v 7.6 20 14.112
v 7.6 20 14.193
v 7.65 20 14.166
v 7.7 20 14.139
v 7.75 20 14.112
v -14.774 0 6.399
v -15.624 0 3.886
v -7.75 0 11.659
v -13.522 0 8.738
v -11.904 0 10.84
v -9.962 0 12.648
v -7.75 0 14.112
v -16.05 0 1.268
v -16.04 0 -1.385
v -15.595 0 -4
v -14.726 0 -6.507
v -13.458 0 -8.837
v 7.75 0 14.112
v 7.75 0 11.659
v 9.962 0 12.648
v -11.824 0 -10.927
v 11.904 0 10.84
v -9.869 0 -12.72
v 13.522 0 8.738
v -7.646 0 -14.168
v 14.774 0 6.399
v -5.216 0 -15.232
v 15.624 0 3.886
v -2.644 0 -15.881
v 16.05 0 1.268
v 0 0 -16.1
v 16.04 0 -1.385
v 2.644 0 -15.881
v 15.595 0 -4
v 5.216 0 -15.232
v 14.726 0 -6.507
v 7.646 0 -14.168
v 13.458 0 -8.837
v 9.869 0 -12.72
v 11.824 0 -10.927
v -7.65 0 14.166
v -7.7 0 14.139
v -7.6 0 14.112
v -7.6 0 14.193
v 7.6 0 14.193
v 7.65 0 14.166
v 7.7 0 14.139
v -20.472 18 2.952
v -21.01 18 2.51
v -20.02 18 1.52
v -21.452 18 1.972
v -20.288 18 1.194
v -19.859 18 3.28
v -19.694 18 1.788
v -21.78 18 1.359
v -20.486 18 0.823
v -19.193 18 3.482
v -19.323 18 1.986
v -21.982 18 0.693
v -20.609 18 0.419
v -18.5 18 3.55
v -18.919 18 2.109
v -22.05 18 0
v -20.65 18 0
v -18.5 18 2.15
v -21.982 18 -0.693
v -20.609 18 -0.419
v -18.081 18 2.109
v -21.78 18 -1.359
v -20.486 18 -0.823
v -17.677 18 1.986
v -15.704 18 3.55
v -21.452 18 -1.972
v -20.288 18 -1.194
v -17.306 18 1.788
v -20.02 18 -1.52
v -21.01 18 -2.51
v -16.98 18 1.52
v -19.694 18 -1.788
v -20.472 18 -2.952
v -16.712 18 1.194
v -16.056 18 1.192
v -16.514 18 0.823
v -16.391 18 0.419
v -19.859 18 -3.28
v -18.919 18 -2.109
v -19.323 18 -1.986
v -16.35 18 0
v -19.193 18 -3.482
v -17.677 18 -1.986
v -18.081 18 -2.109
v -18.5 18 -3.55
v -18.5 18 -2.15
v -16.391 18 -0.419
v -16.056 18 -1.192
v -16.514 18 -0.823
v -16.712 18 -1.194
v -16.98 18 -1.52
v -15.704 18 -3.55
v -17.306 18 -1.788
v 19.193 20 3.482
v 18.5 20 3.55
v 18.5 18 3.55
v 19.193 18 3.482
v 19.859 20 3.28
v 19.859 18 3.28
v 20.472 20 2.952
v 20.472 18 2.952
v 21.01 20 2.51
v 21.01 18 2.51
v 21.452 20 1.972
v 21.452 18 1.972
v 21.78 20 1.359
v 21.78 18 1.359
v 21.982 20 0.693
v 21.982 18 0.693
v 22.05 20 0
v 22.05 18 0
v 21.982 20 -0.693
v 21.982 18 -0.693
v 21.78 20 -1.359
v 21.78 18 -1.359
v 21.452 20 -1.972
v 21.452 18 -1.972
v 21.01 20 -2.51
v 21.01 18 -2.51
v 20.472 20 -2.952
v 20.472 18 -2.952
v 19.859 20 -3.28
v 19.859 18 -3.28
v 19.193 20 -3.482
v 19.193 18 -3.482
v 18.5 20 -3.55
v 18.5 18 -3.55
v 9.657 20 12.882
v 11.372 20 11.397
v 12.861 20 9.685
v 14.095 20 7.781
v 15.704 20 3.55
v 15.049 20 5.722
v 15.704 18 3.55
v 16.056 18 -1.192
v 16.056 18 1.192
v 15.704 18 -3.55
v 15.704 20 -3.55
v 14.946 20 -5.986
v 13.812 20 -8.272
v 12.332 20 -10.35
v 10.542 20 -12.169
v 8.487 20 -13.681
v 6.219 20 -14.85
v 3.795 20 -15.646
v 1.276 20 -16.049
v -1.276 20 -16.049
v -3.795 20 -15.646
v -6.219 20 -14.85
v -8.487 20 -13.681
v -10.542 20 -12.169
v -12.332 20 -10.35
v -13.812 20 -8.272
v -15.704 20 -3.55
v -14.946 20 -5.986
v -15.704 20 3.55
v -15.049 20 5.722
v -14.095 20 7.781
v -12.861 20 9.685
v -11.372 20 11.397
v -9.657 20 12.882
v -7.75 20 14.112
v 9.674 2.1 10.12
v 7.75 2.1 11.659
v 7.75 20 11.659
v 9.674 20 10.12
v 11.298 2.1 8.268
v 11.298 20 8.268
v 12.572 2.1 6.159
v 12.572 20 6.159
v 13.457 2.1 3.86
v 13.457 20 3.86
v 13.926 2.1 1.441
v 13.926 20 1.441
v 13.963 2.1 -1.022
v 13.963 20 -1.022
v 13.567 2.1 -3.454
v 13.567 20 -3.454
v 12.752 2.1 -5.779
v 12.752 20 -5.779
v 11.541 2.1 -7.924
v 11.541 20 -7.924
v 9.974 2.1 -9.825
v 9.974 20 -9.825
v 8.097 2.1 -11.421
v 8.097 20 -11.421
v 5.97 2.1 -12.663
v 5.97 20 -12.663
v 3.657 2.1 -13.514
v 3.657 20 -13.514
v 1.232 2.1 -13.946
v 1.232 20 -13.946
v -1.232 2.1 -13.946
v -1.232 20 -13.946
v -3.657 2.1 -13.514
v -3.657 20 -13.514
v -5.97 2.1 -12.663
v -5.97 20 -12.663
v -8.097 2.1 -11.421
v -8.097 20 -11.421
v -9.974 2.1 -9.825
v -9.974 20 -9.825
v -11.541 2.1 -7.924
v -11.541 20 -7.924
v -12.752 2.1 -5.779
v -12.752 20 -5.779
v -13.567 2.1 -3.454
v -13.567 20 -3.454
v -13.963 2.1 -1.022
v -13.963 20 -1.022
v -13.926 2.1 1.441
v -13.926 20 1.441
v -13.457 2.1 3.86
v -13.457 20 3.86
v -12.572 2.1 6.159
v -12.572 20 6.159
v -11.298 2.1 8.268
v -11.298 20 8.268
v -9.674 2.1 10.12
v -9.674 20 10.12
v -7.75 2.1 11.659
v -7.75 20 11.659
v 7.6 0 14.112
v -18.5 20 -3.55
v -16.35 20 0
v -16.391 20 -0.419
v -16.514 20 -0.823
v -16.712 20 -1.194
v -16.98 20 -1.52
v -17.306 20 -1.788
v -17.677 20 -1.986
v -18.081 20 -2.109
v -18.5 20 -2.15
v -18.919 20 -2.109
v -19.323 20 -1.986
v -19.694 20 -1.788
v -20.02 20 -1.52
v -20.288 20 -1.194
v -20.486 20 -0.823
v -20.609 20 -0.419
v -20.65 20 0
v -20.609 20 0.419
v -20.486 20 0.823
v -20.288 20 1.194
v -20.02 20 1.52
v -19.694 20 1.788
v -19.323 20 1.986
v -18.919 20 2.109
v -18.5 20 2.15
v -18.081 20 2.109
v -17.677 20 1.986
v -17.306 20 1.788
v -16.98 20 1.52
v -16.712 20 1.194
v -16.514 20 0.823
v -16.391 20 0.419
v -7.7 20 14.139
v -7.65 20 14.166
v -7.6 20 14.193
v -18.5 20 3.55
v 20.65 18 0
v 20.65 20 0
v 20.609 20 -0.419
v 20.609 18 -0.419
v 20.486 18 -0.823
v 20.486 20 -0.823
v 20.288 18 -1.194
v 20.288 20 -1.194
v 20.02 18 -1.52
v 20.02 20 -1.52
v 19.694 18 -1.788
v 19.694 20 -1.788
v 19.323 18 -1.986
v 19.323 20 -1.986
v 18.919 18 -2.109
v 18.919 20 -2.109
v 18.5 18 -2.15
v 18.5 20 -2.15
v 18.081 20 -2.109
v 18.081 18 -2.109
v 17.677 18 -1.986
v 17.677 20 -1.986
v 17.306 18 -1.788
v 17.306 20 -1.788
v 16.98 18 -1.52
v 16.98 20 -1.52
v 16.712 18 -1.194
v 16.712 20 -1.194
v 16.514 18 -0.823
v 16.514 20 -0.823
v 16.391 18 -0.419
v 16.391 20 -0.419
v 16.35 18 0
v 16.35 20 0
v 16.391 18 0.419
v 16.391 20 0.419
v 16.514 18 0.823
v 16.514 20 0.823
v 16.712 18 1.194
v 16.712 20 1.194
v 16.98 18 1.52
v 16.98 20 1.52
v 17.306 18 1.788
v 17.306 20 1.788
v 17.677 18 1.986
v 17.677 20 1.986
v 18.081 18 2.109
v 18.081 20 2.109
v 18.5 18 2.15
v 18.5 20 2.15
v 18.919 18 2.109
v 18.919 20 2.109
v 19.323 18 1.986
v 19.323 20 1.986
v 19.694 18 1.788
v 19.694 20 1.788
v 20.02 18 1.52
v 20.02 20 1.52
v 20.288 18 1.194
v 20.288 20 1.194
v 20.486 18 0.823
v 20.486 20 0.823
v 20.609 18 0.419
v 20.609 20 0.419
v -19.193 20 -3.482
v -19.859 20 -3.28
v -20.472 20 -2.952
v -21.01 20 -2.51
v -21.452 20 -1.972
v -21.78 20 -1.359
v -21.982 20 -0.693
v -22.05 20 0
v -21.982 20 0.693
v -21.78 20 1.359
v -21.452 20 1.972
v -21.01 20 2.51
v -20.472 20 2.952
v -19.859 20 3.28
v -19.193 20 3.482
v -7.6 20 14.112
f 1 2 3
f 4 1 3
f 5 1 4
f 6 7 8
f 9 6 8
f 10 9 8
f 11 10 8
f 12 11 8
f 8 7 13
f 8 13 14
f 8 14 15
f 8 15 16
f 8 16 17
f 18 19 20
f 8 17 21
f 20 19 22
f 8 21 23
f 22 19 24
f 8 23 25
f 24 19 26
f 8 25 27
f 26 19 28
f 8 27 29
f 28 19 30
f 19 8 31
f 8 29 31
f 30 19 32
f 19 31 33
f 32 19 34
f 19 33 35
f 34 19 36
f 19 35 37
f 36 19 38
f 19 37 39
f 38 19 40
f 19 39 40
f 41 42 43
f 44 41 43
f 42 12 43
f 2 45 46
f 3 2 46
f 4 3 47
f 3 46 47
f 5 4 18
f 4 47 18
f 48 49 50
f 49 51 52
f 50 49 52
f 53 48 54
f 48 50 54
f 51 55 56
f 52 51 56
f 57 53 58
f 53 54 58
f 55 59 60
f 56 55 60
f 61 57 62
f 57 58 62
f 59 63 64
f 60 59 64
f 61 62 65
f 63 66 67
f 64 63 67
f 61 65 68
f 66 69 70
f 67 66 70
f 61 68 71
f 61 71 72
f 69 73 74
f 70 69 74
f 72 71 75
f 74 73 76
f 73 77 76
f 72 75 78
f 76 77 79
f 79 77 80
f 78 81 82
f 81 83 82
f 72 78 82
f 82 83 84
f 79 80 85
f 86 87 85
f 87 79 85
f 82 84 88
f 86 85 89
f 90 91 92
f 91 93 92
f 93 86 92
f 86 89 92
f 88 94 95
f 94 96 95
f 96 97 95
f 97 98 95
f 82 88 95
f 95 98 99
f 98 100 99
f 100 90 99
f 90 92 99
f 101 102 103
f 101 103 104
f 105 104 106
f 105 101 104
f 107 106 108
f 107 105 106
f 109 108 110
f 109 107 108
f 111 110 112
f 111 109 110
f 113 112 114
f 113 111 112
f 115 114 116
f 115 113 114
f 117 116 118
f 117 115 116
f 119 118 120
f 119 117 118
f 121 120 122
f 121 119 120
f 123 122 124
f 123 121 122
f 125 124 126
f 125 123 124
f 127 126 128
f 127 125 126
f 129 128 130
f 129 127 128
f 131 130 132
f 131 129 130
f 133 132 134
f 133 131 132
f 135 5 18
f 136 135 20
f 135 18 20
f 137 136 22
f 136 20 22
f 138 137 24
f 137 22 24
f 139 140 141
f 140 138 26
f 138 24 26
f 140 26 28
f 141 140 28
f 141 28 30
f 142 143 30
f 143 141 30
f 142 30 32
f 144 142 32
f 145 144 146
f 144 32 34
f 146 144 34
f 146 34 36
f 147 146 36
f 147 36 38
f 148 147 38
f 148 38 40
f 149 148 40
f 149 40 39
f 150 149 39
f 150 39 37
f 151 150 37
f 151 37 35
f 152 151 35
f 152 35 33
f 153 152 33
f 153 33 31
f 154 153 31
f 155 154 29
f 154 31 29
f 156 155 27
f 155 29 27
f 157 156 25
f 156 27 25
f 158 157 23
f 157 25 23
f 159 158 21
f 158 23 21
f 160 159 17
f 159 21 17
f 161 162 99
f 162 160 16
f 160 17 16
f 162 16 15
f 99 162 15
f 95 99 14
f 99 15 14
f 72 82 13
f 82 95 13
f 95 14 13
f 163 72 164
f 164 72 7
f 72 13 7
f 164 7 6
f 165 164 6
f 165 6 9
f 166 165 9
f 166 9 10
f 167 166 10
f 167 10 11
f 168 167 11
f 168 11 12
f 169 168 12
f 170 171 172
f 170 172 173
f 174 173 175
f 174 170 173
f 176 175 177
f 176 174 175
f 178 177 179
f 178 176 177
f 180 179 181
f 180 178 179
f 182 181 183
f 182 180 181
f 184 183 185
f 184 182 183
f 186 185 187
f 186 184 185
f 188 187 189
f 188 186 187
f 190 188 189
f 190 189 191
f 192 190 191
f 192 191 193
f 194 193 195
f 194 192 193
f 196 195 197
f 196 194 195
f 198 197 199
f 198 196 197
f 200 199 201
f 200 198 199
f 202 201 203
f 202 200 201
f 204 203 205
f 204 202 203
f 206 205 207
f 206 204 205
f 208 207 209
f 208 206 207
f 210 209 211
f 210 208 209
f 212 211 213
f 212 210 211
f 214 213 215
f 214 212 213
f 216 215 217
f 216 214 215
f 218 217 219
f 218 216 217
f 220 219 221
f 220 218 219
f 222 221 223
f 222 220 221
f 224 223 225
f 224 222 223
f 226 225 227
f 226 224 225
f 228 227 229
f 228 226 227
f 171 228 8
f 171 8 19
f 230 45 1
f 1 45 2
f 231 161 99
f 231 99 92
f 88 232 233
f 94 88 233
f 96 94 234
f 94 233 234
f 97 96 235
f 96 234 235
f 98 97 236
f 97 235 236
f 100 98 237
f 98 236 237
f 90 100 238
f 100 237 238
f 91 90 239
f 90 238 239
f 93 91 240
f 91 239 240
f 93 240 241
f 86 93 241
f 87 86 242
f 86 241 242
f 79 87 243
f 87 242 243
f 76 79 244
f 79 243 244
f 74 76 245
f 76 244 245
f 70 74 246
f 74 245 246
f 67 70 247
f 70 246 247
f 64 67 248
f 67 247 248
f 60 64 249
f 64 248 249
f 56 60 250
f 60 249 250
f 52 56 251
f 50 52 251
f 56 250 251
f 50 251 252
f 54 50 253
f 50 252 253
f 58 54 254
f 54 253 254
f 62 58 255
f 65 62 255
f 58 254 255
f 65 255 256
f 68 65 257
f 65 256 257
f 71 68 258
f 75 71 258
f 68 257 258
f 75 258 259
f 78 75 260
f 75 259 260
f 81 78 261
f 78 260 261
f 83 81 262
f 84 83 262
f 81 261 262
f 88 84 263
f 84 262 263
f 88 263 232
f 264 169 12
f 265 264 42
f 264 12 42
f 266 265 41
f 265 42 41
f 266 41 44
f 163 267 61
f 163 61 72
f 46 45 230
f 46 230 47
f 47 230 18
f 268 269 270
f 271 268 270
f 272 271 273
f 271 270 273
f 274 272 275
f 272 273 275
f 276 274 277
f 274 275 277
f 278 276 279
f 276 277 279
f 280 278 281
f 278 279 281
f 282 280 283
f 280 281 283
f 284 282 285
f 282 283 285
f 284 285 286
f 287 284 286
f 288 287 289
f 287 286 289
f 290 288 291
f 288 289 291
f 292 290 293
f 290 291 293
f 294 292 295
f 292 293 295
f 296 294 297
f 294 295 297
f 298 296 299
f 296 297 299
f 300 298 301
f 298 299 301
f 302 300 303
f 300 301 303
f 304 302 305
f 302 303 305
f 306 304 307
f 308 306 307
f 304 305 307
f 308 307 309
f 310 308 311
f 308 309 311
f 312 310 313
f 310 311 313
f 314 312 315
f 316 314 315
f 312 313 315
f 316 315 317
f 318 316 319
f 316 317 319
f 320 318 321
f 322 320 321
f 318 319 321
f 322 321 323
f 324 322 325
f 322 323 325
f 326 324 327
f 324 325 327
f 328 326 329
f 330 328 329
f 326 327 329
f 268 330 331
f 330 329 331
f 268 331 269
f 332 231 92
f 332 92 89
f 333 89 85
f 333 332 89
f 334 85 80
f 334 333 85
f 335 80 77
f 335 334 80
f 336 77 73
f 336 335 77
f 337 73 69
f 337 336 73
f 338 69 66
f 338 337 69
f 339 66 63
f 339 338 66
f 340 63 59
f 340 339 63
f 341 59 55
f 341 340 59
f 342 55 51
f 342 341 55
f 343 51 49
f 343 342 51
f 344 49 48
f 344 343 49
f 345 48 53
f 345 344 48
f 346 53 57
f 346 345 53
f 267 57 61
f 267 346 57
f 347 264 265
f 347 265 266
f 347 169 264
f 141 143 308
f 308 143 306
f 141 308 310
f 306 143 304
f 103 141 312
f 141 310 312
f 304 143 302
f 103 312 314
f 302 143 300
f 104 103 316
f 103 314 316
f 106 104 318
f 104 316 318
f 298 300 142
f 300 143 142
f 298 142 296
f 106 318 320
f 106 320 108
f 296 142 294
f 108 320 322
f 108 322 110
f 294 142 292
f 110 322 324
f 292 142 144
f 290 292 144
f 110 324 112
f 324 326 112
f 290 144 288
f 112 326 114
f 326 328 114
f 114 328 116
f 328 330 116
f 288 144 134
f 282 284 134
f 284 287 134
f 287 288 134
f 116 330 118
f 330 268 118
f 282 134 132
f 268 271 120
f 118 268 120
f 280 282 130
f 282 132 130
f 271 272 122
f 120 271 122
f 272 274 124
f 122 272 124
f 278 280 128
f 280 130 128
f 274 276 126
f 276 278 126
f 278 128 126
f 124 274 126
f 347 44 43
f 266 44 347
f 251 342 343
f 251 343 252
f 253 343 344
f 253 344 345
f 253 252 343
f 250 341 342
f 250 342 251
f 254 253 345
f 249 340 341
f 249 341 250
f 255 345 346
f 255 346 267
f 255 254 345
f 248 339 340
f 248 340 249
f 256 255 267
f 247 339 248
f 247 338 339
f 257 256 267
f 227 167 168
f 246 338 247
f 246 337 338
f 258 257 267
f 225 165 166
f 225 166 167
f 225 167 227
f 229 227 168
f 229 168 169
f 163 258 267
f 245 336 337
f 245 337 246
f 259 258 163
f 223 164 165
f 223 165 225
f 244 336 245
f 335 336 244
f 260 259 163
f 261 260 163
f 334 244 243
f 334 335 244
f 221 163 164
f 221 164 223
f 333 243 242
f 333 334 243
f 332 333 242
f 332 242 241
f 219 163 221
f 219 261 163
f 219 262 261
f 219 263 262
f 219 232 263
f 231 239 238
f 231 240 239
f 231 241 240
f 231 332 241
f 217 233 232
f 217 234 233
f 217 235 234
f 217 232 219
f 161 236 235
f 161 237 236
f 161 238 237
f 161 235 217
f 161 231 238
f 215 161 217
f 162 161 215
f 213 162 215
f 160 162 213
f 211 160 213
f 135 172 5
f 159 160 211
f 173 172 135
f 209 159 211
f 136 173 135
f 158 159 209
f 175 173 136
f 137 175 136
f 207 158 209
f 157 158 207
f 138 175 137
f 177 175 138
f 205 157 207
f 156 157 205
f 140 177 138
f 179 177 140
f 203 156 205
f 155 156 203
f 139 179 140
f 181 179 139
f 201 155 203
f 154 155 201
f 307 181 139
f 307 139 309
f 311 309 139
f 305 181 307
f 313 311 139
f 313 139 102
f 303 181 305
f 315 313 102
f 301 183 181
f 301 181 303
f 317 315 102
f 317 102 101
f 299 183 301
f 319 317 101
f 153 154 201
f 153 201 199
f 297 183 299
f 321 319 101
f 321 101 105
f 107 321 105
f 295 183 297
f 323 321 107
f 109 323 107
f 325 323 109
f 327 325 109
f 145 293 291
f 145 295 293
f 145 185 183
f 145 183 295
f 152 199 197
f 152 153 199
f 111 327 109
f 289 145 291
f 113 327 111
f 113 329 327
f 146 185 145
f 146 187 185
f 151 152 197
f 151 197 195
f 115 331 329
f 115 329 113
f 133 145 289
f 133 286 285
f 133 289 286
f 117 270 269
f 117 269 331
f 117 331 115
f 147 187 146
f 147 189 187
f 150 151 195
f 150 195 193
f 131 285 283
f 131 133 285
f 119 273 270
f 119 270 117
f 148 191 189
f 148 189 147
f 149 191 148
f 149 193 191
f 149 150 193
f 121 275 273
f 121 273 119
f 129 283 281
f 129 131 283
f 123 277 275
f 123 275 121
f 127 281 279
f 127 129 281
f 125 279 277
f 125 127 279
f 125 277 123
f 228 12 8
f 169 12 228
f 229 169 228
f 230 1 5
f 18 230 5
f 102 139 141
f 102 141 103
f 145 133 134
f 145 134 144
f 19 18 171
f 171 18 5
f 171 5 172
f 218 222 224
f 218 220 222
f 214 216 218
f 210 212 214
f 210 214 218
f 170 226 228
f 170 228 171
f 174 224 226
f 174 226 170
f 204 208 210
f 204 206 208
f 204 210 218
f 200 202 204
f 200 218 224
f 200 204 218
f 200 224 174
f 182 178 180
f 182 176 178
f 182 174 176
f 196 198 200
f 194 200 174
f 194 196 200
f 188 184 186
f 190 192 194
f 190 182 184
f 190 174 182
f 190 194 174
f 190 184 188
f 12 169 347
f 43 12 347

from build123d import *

# Parameters (mm, degrees)
BOSS_EXTRUDE1_DEPTH = 20
SHELL2_T            = -2.1
SKETCH2_R           = 2.15
BOSS_EXTRUDE2_DEPTH = 2
SKETCH3_W           = 15.5
SKETCH3_H           = 2.452739194
CUT_EXTRUDE1_DEPTH  = 21
CUT_EXTRUDE2_REACH  = 32.293
SKETCH4_W           = 15.2
SKETCH4_H           = 20


with BuildPart() as part:
    # Sketch1 → Boss-Extrude1 (new body)
    with BuildSketch(Plane(origin=(0, 0, 0), x_dir=(1, 0, 0), z_dir=(0, 1, 0))):
        with BuildLine():
            Line((-7.6, -14.193308282), (7.6, -14.193308282))
            ThreePointArc((7.6, -14.193308282), (0, 16.1), (-7.6, -14.193308282))
        make_face()
    extrude(amount=BOSS_EXTRUDE1_DEPTH)

    # Shell2
    shell2_openings = [part.faces().sort_by_distance(p)[0] for p in [
        (0, 20, -0.953345859),
    ]]
    offset(amount=SHELL2_T, openings=shell2_openings)

    # Sketch2 → Boss-Extrude2 (add)
    with BuildSketch(Plane(origin=(0, 20, 0), x_dir=(1, 0, 0), z_dir=(0, 1, 0))):
        with BuildLine():
            Line((-15.703741592, 3.55), (-18.5, 3.55))
            ThreePointArc((-18.5, 3.55), (-22.05, 0), (-18.5, -3.55))
            Line((-18.5, -3.55), (-15.703741592, -3.55))
            ThreePointArc((-15.703741592, -3.55), (-16.1, 0), (-15.703741592, 3.55))
        make_face()
        with Locations((-18.5, 0)):
            Circle(SKETCH2_R, mode=Mode.SUBTRACT)
        with BuildLine():
            Line((18.5, 3.55), (15.703741592, 3.55))
            ThreePointArc((15.703741592, 3.55), (16.1, 0), (15.703741592, -3.55))
            Line((15.703741592, -3.55), (18.5, -3.55))
            ThreePointArc((18.5, -3.55), (22.05, 0), (18.5, 3.55))
        make_face()
        with Locations((18.5, 0)):
            Circle(SKETCH2_R, mode=Mode.SUBTRACT)
    extrude(amount=-BOSS_EXTRUDE2_DEPTH)

    # Sketch3 → Cut-Extrude1 (cut, through all)
    with BuildSketch(Plane(origin=(0, 20, 0), x_dir=(1, 0, 0), z_dir=(0, 1, 0))):
        with Locations((0, -12.885593413)):
            Rectangle(SKETCH3_W, SKETCH3_H)
    extrude(amount=-CUT_EXTRUDE1_DEPTH, mode=Mode.SUBTRACT)

    # Sketch4 → Cut-Extrude2 (cut, up to next)
    with BuildSketch(Plane.XY.offset(14.193308282), mode=Mode.PRIVATE) as cut_extrude2_sk1:
        with Locations((0, 10)):
            Rectangle(SKETCH4_W, SKETCH4_H)
    cut_extrude2_tool1 = extrude(cut_extrude2_sk1.sketch, amount=-CUT_EXTRUDE2_REACH, mode=Mode.PRIVATE) & part.part
    add(cut_extrude2_tool1.solids().sort_by_distance((0, 10, 14.193308))[0], mode=Mode.SUBTRACT)


solid = part.part
